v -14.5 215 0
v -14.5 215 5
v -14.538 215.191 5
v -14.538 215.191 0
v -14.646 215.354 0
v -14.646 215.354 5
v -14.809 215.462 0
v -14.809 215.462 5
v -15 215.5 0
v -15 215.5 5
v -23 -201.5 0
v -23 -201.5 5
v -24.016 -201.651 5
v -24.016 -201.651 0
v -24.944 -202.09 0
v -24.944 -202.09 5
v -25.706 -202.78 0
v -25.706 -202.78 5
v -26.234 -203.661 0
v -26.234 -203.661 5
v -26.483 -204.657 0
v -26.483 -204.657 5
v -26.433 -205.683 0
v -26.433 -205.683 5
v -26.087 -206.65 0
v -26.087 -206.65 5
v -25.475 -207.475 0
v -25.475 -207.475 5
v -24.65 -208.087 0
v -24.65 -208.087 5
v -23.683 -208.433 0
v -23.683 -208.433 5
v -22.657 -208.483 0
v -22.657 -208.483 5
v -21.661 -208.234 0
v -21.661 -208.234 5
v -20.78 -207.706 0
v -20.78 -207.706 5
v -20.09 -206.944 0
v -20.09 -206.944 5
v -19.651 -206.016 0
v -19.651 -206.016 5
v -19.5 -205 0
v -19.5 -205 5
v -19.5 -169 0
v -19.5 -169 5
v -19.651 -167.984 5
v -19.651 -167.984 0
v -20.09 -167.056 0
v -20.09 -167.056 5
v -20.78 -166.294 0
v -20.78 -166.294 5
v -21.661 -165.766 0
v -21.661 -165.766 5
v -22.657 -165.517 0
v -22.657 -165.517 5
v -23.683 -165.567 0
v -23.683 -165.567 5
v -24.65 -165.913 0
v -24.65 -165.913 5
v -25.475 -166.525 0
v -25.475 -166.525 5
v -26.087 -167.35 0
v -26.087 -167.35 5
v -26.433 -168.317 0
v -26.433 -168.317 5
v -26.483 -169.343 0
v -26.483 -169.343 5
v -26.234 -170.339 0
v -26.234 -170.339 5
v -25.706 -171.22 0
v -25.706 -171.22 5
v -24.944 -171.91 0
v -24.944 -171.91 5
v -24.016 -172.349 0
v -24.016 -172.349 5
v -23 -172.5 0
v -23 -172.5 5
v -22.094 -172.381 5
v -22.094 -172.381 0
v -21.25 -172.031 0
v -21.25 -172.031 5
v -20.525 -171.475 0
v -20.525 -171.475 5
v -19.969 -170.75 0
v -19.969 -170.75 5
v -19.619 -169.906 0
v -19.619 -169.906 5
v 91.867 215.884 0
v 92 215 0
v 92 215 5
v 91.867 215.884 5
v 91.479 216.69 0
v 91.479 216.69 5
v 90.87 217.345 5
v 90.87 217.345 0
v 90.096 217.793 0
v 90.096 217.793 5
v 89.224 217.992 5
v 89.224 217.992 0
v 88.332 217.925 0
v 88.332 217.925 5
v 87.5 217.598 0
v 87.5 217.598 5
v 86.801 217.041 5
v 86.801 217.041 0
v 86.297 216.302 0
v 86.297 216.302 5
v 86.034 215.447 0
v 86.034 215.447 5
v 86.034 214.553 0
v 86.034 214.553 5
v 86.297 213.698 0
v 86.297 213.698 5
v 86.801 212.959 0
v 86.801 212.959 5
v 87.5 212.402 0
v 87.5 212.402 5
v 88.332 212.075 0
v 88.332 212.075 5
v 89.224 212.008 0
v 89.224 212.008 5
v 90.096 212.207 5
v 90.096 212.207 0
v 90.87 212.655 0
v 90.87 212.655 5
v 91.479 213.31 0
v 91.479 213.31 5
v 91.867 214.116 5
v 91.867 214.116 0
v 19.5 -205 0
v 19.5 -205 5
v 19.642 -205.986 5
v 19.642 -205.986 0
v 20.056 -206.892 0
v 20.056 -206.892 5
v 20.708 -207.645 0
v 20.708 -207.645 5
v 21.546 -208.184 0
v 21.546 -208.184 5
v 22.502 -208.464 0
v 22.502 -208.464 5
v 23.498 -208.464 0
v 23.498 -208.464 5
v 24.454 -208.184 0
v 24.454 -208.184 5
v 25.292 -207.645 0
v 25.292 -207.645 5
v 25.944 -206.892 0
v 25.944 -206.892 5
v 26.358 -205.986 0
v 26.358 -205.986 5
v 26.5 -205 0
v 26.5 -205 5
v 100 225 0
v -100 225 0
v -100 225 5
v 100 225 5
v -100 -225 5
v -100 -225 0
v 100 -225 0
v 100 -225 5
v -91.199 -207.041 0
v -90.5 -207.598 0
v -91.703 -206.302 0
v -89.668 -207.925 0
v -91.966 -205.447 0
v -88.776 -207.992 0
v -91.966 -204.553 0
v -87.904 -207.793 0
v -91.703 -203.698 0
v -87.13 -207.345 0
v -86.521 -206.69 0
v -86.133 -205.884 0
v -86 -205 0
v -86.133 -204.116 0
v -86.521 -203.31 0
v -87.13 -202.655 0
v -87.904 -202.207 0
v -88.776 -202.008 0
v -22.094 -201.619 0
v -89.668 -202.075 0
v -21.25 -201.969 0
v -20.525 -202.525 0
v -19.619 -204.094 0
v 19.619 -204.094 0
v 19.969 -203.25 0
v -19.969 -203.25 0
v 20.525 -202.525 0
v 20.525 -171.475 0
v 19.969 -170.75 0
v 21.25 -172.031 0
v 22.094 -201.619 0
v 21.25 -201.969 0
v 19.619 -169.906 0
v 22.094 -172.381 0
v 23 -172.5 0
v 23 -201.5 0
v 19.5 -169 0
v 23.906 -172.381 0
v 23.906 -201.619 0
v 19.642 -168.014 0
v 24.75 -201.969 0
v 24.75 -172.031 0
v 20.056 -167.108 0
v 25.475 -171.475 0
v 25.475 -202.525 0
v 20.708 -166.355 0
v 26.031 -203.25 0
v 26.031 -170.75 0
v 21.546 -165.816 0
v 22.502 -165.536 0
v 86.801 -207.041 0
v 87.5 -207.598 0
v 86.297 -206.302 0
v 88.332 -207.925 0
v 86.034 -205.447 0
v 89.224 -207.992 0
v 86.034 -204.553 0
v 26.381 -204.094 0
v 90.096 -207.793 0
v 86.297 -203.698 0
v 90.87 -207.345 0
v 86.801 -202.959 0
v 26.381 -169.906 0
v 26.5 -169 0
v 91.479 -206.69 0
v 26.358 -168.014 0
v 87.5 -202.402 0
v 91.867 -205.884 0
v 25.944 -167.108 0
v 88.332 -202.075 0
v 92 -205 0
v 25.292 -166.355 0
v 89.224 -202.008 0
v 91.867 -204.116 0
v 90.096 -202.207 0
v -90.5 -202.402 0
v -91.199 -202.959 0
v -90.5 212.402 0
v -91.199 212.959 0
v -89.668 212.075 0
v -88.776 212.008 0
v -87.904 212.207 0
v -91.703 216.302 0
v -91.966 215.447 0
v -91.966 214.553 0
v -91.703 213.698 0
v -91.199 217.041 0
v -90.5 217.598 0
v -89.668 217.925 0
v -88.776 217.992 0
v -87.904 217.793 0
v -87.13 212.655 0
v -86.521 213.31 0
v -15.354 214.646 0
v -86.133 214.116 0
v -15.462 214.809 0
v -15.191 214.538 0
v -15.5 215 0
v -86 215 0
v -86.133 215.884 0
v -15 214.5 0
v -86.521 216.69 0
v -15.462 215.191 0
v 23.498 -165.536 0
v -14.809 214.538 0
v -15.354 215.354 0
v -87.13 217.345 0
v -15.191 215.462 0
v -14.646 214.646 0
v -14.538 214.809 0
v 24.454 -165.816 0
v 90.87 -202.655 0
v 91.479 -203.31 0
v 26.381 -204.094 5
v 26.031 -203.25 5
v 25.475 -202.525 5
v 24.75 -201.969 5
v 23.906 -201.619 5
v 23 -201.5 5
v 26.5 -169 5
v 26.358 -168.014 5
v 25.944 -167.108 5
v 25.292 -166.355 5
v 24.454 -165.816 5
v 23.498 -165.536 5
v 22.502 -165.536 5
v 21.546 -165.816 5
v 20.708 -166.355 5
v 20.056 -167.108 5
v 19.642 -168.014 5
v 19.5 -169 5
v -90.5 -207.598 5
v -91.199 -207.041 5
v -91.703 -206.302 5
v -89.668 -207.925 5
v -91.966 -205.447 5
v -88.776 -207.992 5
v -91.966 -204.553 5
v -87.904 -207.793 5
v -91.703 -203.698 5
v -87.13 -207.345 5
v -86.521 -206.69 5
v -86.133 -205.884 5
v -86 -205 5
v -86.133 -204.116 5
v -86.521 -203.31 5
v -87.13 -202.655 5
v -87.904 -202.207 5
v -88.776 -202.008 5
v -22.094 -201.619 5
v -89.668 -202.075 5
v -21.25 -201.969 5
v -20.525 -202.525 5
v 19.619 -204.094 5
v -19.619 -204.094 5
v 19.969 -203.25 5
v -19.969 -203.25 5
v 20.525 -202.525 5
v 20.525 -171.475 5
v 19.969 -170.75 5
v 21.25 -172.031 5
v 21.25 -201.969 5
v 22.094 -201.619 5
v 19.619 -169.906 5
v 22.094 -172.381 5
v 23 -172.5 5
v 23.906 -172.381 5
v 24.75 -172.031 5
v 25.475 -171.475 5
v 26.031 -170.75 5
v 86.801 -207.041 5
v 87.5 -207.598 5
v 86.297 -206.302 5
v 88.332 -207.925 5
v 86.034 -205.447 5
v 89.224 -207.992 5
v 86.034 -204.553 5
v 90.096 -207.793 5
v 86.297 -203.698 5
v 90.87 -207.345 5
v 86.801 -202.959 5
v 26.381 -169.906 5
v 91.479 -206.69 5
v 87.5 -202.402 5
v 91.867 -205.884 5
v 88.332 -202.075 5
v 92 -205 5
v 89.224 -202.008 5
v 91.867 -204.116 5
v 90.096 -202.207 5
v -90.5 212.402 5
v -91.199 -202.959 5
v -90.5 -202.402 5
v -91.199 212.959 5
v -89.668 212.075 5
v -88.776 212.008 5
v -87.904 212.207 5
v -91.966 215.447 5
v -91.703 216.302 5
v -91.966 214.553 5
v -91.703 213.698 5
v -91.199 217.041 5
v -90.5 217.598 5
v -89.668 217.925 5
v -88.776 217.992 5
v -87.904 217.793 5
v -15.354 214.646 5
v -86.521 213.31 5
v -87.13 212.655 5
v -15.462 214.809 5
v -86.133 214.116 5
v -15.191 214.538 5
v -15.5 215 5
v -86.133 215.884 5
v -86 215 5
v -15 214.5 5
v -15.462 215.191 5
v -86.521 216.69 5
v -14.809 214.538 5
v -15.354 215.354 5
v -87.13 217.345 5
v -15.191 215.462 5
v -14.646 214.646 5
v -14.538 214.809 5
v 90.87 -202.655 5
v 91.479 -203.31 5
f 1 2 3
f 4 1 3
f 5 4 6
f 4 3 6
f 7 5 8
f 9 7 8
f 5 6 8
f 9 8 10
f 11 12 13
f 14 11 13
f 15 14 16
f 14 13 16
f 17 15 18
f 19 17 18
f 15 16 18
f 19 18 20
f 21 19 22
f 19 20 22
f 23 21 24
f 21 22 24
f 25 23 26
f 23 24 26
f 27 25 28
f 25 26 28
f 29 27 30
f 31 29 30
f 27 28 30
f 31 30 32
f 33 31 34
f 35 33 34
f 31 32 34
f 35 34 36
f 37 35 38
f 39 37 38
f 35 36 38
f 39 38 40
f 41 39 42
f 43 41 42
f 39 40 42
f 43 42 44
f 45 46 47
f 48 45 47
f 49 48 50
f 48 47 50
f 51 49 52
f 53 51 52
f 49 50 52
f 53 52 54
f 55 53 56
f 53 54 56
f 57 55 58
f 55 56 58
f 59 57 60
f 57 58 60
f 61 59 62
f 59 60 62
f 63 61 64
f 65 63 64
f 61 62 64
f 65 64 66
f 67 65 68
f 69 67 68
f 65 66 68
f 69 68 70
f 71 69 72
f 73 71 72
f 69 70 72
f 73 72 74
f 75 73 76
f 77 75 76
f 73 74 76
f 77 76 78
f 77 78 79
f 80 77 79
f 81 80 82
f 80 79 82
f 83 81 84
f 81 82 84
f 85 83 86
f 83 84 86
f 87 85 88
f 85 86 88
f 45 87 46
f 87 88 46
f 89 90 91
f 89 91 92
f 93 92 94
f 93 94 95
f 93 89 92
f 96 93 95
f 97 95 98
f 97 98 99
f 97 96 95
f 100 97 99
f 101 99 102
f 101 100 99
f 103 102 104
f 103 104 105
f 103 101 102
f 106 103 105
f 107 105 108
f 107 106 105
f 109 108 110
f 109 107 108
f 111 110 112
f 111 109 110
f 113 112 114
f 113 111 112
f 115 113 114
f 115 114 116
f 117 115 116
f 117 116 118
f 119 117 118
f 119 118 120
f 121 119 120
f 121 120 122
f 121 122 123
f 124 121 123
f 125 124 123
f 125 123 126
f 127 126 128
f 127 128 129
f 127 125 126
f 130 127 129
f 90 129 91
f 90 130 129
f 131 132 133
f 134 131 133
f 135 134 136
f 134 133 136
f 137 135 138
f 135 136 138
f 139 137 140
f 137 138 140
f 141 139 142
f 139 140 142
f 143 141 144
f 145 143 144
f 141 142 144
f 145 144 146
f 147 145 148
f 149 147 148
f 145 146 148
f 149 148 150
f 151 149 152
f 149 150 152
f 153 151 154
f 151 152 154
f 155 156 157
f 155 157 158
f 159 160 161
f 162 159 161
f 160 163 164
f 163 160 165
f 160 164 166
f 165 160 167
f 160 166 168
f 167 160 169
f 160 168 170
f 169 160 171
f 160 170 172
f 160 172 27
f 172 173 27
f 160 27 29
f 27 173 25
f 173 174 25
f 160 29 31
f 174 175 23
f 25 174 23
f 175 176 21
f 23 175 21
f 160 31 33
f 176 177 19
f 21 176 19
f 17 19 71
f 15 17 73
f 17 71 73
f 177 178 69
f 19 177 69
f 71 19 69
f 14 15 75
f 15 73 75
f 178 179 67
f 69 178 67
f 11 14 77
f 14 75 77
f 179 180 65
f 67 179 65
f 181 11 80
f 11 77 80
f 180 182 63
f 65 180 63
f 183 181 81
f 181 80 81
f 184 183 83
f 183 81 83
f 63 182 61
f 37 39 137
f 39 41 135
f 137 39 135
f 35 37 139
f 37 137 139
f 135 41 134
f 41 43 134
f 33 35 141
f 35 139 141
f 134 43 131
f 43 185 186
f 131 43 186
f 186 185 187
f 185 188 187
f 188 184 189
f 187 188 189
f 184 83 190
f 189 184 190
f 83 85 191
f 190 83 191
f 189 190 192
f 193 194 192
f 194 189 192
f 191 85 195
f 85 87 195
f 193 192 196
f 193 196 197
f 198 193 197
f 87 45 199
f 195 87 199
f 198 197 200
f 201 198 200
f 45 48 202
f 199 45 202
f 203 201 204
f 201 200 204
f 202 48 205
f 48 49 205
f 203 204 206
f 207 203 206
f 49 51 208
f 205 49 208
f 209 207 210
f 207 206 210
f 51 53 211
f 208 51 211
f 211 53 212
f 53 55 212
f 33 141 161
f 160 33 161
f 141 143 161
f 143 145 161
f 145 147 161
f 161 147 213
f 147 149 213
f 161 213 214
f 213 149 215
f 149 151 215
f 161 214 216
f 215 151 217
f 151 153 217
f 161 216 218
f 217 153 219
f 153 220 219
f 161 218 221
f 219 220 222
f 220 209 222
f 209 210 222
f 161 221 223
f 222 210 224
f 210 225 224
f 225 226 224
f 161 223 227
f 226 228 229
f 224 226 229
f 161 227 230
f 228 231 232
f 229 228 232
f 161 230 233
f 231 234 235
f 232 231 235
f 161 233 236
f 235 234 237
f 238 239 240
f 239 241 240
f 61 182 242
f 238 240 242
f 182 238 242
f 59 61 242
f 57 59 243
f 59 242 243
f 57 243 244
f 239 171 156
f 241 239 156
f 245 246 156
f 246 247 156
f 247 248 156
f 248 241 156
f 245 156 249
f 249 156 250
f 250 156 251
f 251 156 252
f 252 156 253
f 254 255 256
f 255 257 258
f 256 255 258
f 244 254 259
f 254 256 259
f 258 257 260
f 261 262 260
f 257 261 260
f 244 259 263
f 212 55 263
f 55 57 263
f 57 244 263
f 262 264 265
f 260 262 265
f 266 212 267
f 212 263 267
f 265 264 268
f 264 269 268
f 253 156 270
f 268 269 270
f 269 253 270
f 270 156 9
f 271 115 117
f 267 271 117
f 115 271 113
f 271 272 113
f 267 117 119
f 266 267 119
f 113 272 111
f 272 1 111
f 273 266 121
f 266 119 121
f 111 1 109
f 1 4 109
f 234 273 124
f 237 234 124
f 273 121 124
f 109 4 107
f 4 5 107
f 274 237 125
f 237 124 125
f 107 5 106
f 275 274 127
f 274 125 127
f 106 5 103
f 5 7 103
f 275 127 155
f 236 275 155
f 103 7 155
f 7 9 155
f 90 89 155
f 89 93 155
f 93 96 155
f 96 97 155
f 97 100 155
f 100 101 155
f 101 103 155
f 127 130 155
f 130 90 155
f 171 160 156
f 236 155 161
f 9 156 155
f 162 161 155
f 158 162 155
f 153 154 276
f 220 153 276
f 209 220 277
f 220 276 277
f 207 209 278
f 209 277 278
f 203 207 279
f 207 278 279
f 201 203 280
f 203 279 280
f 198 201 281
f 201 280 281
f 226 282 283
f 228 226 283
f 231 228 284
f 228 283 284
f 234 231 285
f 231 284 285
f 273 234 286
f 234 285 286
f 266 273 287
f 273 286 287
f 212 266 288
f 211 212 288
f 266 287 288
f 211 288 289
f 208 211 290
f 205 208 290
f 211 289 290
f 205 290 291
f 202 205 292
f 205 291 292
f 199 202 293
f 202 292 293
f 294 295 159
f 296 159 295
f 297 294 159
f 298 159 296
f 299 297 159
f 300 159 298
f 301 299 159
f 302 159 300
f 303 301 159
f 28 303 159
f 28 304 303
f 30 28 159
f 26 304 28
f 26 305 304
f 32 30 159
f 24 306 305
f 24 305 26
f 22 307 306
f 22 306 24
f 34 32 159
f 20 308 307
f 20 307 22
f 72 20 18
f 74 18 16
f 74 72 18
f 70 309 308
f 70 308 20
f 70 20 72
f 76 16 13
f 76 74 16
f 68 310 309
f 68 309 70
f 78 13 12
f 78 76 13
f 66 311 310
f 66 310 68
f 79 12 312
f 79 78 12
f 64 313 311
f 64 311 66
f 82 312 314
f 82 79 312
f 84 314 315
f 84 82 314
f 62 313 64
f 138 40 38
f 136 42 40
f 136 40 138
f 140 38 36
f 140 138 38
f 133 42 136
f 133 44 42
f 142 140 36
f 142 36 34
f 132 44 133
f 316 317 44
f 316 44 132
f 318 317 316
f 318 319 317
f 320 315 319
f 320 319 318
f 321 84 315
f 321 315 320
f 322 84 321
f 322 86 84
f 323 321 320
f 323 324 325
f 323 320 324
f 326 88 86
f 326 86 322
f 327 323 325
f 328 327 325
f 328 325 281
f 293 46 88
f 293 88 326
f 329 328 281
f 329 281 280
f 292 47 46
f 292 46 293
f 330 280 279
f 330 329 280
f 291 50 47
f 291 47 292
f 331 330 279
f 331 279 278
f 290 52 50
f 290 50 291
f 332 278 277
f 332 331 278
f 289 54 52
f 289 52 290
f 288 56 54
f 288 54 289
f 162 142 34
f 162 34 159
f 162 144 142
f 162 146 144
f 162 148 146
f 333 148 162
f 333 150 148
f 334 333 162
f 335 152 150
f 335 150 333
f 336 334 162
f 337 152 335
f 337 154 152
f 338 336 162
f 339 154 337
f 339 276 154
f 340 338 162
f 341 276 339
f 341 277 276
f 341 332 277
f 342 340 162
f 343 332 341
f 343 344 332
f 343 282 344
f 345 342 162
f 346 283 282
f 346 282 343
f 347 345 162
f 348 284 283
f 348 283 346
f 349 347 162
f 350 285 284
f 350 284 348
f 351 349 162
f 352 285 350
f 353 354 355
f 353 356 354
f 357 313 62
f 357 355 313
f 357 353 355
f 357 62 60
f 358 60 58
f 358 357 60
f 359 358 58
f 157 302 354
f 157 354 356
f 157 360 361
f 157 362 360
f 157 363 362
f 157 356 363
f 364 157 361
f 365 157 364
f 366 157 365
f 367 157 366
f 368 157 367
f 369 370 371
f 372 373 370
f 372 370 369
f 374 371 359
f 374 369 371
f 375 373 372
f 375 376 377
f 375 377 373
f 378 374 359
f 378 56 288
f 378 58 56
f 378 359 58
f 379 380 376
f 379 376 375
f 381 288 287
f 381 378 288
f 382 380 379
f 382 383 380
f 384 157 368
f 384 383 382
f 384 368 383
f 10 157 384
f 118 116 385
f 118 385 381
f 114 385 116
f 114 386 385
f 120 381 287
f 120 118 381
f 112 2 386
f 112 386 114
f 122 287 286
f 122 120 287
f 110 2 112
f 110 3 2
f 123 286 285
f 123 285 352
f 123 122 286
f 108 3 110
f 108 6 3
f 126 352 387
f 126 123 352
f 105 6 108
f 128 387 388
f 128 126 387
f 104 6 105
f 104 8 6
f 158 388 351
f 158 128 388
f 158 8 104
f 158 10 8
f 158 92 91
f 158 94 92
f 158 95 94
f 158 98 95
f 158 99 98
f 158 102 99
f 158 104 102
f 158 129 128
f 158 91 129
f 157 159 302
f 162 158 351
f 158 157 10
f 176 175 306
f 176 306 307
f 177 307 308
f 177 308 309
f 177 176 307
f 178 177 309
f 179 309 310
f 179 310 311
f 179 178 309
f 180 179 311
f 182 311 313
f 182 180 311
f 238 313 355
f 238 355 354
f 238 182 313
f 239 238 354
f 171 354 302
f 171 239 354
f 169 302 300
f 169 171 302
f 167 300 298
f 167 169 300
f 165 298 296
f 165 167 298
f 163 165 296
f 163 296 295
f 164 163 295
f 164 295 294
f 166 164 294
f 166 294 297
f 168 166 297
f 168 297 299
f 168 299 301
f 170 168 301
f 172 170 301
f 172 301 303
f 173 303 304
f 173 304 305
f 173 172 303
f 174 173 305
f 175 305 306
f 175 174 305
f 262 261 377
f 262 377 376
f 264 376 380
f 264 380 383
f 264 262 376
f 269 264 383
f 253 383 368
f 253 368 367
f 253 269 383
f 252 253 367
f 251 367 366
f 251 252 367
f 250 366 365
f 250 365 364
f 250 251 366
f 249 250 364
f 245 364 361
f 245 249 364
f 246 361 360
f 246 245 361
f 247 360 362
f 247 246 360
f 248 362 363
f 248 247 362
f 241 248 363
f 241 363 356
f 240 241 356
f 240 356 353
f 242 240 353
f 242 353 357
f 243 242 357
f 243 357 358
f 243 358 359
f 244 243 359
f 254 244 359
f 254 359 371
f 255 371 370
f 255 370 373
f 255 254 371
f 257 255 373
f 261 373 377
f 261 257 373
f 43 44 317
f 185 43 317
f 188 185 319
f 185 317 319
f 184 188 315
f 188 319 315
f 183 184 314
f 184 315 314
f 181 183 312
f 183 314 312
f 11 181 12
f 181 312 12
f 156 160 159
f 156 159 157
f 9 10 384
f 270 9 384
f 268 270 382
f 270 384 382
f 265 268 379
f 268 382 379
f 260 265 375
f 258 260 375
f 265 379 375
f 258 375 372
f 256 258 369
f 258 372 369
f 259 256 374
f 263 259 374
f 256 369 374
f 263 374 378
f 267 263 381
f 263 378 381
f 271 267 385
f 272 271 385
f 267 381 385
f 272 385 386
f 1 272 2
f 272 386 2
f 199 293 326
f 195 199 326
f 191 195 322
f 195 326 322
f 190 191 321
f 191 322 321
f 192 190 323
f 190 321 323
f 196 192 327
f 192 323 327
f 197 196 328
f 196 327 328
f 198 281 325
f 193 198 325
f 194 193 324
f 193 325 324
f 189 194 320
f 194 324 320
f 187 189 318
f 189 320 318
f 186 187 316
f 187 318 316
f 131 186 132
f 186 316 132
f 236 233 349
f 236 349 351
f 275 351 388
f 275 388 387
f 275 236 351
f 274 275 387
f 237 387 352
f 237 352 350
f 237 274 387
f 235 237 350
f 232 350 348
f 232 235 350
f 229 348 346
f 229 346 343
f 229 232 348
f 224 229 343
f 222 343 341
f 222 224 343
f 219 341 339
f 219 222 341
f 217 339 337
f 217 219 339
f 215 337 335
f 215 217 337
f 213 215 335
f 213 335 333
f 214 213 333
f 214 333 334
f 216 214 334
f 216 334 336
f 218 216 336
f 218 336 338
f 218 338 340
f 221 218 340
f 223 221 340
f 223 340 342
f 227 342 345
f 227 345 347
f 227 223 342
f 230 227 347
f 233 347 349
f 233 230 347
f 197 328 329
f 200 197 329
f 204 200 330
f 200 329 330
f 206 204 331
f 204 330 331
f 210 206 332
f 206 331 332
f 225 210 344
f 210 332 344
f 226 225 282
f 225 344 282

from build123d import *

# Parameters (mm, degrees)
F0_W     = 200
F0_H     = 450
F0_R     = 3
F1_DEPTH = 5
F3_DEPTH = 5.001
F5_DEPTH = 25


with BuildPart() as f1:
    # F0 (on Top) → F1 (new body)
    with BuildSketch(Plane.XY):
        Rectangle(F0_W, F0_H)
        with Locations((-89, -205)):
            Circle(F0_R, mode=Mode.SUBTRACT)
        with Locations((89, -205)):
            Circle(F0_R, mode=Mode.SUBTRACT)
        with Locations((-89, 215)):
            Circle(F0_R, mode=Mode.SUBTRACT)
        with Locations((89, 215)):
            Circle(F0_R, mode=Mode.SUBTRACT)
    extrude(amount=F1_DEPTH)

    # F2 (on face) → F3 (cut, through all)
    with BuildSketch(Plane.XY.offset(5)):
        with BuildLine():
            Line((-23, -169), (-19.5, -169))
            ThreePointArc((-19.5, -169), (-25.474874, -166.525126), (-23, -172.5))
            Line((-23, -172.5), (-23, -169))
        make_face()
        with BuildLine():
            ThreePointArc((-23, -172.5), (-20.525126, -171.474874), (-19.5, -169))
            Line((-19.5, -169), (-23, -169))
            Line((-23, -169), (-23, -172.5))
        make_face()
        with BuildLine():
            Line((23, -169), (23, -172.5))
            ThreePointArc((23, -172.5), (25.474874, -171.474874), (26.5, -169))
            ThreePointArc((26.5, -169), (23, -165.5), (19.5, -169))
            Line((19.5, -169), (23, -169))
        make_face()
        with BuildLine():
            ThreePointArc((19.5, -169), (20.525126, -171.474874), (23, -172.5))
            Line((23, -172.5), (23, -169))
            Line((23, -169), (19.5, -169))
        make_face()
        with BuildLine():
            ThreePointArc((23, -201.5), (20.525126, -202.525126), (19.5, -205))
            Line((19.5, -205), (23, -205))
            Line((23, -205), (23, -201.5))
        make_face()
        with BuildLine():
            ThreePointArc((-19.5, -205), (-20.525126, -202.525126), (-23, -201.5))
            ThreePointArc((-23, -201.5), (-25.474874, -207.474874), (-19.5, -205))
        make_face()
        with BuildLine():
            Line((23, -205), (19.5, -205))
            ThreePointArc((19.5, -205), (23, -208.5), (26.5, -205))
            ThreePointArc((26.5, -205), (25.474874, -202.525126), (23, -201.5))
            Line((23, -201.5), (23, -205))
        make_face()
    extrude(amount=-F3_DEPTH, mode=Mode.SUBTRACT)

    # F4 (on face) → F5 (cut)
    with BuildSketch(Plane.XY.offset(5)):
        with BuildLine():
            ThreePointArc((-15, 215.5), (-15.353553, 214.646447), (-14.5, 215))
            ThreePointArc((-14.5, 215), (-14.646447, 215.353553), (-15, 215.5))
        make_face()
    extrude(amount=-F5_DEPTH, mode=Mode.SUBTRACT)


solid = f1.part
